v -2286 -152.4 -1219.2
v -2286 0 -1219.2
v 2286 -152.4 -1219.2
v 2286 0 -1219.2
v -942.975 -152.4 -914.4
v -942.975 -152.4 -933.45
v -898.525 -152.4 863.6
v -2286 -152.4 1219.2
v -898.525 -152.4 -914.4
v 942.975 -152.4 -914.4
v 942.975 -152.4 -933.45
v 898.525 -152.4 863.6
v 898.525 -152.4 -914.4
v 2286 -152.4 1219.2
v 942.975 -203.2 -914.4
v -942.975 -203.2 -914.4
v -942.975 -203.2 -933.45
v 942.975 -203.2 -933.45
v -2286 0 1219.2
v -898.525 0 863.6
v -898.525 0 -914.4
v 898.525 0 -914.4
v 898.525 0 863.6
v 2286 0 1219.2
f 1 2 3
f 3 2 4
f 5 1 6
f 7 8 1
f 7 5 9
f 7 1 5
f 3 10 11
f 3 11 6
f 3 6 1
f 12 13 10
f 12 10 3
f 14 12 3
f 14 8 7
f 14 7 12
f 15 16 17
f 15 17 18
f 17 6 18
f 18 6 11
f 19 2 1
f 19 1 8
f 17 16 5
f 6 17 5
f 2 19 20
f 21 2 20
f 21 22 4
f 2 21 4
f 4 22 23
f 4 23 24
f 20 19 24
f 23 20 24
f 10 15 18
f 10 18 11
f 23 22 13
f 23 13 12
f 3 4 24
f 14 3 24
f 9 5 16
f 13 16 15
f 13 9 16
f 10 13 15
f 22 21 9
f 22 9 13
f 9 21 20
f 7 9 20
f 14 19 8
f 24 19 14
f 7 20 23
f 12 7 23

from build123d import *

# Parameters (mm, degrees)
F0_W     = 4572
F0_H     = 2438.4
F0_W_2   = 1797.05
F0_H_2   = 1778
F1_DEPTH = 152.4
F2_W     = 1885.95
F2_H     = 50.8
F3_DEPTH = 19.05


with BuildPart() as f1:
    # F0 (on Front) → F1 (new body)
    with BuildSketch(Plane.XZ):
        Rectangle(F0_W, F0_H)
        with Locations((0, -25.4)):
            Rectangle(F0_W_2, F0_H_2, mode=Mode.SUBTRACT)
    extrude(amount=F1_DEPTH)

    # F2 (on face) → F3 (join)
    with BuildSketch(Plane.XY.offset(-914.4)):
        with Locations((0, -177.8)):
            Rectangle(F2_W, F2_H)
    extrude(amount=-F3_DEPTH)


solid = f1.part
